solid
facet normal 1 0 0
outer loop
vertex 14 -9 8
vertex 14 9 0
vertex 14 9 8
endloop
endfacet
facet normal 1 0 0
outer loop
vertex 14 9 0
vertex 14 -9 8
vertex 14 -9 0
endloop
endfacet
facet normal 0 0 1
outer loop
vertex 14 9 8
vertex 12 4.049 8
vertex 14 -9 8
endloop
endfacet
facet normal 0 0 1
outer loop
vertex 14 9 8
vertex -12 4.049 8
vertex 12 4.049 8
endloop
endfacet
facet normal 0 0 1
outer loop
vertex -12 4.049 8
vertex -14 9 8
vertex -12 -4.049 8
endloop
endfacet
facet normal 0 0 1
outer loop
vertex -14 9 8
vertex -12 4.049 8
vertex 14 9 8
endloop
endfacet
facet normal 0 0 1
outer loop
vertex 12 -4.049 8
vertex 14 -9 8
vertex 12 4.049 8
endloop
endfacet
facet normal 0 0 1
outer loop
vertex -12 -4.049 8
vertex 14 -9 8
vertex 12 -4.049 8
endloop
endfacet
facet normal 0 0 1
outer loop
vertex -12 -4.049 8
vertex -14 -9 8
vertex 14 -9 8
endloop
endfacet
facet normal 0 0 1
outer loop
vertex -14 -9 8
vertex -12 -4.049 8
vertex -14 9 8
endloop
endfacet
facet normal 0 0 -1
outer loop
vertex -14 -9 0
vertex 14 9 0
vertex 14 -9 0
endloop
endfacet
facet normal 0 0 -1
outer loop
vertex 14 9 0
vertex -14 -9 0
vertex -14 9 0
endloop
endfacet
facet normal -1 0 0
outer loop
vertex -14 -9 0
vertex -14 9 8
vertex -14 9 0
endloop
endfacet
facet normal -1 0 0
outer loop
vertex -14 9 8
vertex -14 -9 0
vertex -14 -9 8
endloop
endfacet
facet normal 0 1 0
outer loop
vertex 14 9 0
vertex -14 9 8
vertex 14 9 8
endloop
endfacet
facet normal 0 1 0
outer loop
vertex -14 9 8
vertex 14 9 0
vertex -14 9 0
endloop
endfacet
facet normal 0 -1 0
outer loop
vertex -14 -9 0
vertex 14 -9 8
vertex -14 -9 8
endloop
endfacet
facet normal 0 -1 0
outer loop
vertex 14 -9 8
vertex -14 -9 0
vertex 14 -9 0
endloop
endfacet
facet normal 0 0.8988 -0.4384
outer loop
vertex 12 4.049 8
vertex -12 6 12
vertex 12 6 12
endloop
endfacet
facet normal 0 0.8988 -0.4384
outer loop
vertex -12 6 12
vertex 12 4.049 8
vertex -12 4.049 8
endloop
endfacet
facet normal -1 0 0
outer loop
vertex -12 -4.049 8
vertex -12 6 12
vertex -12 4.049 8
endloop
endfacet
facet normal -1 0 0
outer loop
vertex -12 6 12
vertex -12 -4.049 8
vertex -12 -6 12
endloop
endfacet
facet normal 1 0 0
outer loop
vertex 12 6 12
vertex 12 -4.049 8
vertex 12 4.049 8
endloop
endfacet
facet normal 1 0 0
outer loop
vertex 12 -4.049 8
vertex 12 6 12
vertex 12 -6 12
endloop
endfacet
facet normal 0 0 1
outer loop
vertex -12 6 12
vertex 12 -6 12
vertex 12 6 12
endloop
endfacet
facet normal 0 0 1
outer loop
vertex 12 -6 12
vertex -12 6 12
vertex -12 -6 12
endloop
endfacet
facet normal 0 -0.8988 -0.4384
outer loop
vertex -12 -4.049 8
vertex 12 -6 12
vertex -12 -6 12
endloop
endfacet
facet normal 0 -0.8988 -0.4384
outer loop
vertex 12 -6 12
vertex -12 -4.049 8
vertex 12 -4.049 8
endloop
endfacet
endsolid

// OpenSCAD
// Small printable lock prototypes for the smart mechanical block concept.
//
// Each scene exports one printable part. The parts are intentionally small
// fit coupons: big enough to test the lock by hand, but cheap to print.

$fn = 48;

prototype = 1;
part = "dovetail_male";

fit = 0.35;
loose_fit = 0.45;
block_l = 28;
block_w = 18;
block_h = 8;

function known_part(prototype_number, part_name) =
    (prototype_number == 1 &&
        (part_name == "dovetail_male" ||
            part_name == "dovetail_socket")) ||
    (prototype_number == 2 &&
        (part_name == "bayonet_plug" ||
            part_name == "bayonet_socket")) ||
    (prototype_number == 3 &&
        (part_name == "snap_hook" ||
            part_name == "snap_socket")) ||
    (prototype_number == 4 &&
        (part_name == "wedge_left" ||
            part_name == "wedge_right" ||
            part_name == "wedge_key")) ||
    (prototype_number == 5 &&
        (part_name == "t_slider" ||
            part_name == "t_track")) ||
    (prototype_number == 6 &&
        (part_name == "split_pin_male" ||
            part_name == "split_pin_socket")) ||
    (prototype_number == 7 &&
        (part_name == "thread_plug" ||
            part_name == "thread_socket")) ||
    (prototype_number == 8 &&
        (part_name == "detent_slider" ||
            part_name == "detent_track")) ||
    (prototype_number == 9 &&
        (part_name == "cam_clamp_body" ||
            part_name == "cam_lever" ||
            part_name == "cam_pin")) ||
    (prototype_number == 10 &&
        (part_name == "rack_bar" ||
            part_name == "rack_pawl"));

module block(l = block_l, w = block_w, h = block_h) {
    translate([-l / 2, -w / 2, 0])
        cube([l, w, h]);
}

module prism_x(length, yz_points) {
    rotate([0, 90, 0])
        linear_extrude(height = length, center = true)
            polygon([for (point = yz_points) [-point[1], point[0]]]);
}

module round_pin_x(length, diameter) {
    rotate([0, 90, 0])
        cylinder(d = diameter, h = length, center = true);
}

module round_pin_y(length, diameter) {
    rotate([90, 0, 0])
        cylinder(d = diameter, h = length, center = true);
}

module teardrop_hole_x(length, diameter) {
    union() {
        round_pin_x(length, diameter);
        translate([0, 0, diameter * 0.22])
            prism_x(
                length,
                [
                    [-diameter / 2, 0],
                    [diameter / 2, 0],
                    [0, diameter * 0.78]
                ]
            );
    }
}

module coarse_two_start_thread(length = 8, outer_d = 10, clearance = 0) {
    pitch = 2.4;
    core_d = outer_d - 1.7 + clearance;
    ridge_depth = 1.05 + clearance / 2;
    ridge_width = 0.88 + clearance / 3;
    slice_count = ceil(length / pitch * 28);

    union() {
        cylinder(d = core_d, h = length);

        for (phase = [0, 180])
            rotate([0, 0, phase])
                linear_extrude(
                    height = length,
                    twist = 360 * length / pitch,
                    slices = slice_count,
                    convexity = 8
                )
                    translate([core_d / 2 - 0.22, -ridge_width / 2])
                        square([ridge_depth + 0.22, ridge_width]);
    }
}

module dovetail_male() {
    union() {
        block();
        prism_x(
            block_l - 4,
            [
                [-4.0, block_h - 0.1],
                [4.0, block_h - 0.1],
                [6.0, block_h + 4.0],
                [-6.0, block_h + 4.0]
            ]
        );
    }
}

module dovetail_socket() {
    difference() {
        block();
        prism_x(
            block_l + 0.4,
            [
                [-(4.0 + fit), -0.1],
                [4.0 + fit, -0.1],
                [6.0 + fit, 4.35],
                [-(6.0 + fit), 4.35]
            ]
        );
    }
}

module bayonet_plug() {
    union() {
        block(24, 24, 5);
        translate([0, 0, 4.9])
            cylinder(d = 7.8, h = 6.2);
        translate([0, 0, 8])
            cube([18, 4.0, 2.4], center = true);
        translate([0, 0, 10.9])
            cylinder(d1 = 7.8, d2 = 6.4, h = 1.5);
    }
}

module bayonet_socket() {
    difference() {
        block(24, 24, 9);

        translate([0, 0, -0.1])
            cylinder(d = 8.5, h = 9.2);

        // Vertical lug entry slots from the top.
        translate([0, 0, 5.1])
            cube([20 + loose_fit, 4.8 + loose_fit, 8.2], center = true);

        // Quarter-turn retention pocket below the top skin.
        translate([0, 0, 3.6])
            cube([4.8 + loose_fit, 20 + loose_fit, 3.0], center = true);

        // Relief at the stop so the lugs seat without grinding.
        for (angle = [90, 270])
            rotate([0, 0, angle])
                translate([0, 8.5, 3.5])
                    cylinder(d = 5.2, h = 3.2, center = true);
    }
}

module snap_hook() {
    union() {
        block(24, 18, 6);

        // Flexible cantilever tongue, printed flat and flexing vertically.
        translate([10.5, -3.2, 5.9])
            cube([12, 6.4, 1.35]);

        translate([21.7, -3.2, 5.9])
            prism_x(
                2.4,
                [
                    [-3.2, 0],
                    [3.2, 0],
                    [3.2, 2.8],
                    [-3.2, 1.15]
                ]
            );
    }
}

module snap_socket() {
    difference() {
        block(24, 18, 8);

        translate([-12.1, -3.8, 5.5])
            cube([13.5, 7.6, 2.2]);

        translate([-2.2, -4.2, 5.6])
            cube([2.4, 8.4, 3.0]);
    }
}

module wedge_receiver(left_side = true) {
    difference() {
        block(24, 18, 8);

        translate([0, 0, 4])
            prism_x(
                25,
                [
                    [-2.7, -2.0],
                    [2.7, -2.0],
                    [4.6, 2.3],
                    [-4.6, 2.3]
                ]
            );

        translate([0, left_side ? 6.5 : -6.5, 3.8])
            cube([25, 3.0, 3.5], center = true);
    }
}

module wedge_key() {
    prism_x(
        30,
        [
            [-2.3, 0],
            [2.3, 0],
            [4.0, 3.8],
            [-4.0, 3.8]
        ]
    );

    translate([-17, -5, 0])
        cube([3, 10, 4.2]);
}

module t_slider() {
    union() {
        block();
        translate([0, 0, block_h])
            cube([block_l - 4, 4.0, 4.2], center = true);
        translate([0, 0, block_h + 3.0])
            cube([block_l - 4, 10.0, 2.4], center = true);
    }
}

module t_track() {
    difference() {
        block();
        translate([0, 0, -0.1])
            cube([block_l + 0.4, 4.0 + fit, 4.9], center = true);
        translate([0, 0, 2.9])
            cube([block_l + 0.4, 10.0 + fit, 3.0], center = true);
    }
}

module split_pin_male() {
    difference() {
        union() {
            block(22, 18, 6);

            for (z_offset = [2.2, 4.8]) {
                translate([10.9, 0, z_offset])
                    cube([9.2, 3.2, 1.4], center = true);

                translate([15.3, 0, z_offset])
                    cube([2.4, 4.8, 1.8], center = true);
            }
        }

        // Split gap lets each printed pin compress while entering the socket.
        translate([12.5, -0.45, 1.2])
            cube([8.2, 0.9, 4.8]);
    }
}

module split_pin_socket() {
    difference() {
        block(22, 18, 8);

        for (z_offset = [2.2, 4.8]) {
            translate([-11.1, 0, z_offset])
                cube([10.2, 3.8 + fit, 1.9 + fit], center = true);

            translate([-5.9, 0, z_offset])
                cube([2.5, 5.4 + fit, 2.2 + fit], center = true);
        }
    }
}

module thread_plug() {
    union() {
        block(22, 22, 5);
        translate([0, 0, 4.9])
            coarse_two_start_thread(length = 8.2, outer_d = 9.8);
    }
}

module thread_socket() {
    difference() {
        block(22, 22, 10);
        translate([0, 0, -0.1])
            coarse_two_start_thread(
                length = 10.2,
                outer_d = 9.8,
                clearance = 0.45
            );
    }
}

module detent_slider() {
    union() {
        block(24, 16, 5);

        translate([0, 0, 5])
            cube([22, 6, 2.0], center = true);

        translate([0, 0, 7.1])
            cube([20, 2.0, 2.8], center = true);

        translate([5, 0, 9.1])
            scale([1.0, 0.75, 0.38])
                sphere(d = 5.0);
    }
}

module detent_track() {
    difference() {
        block(26, 18, 8);

        translate([0, 0, 4.8])
            cube([27, 6.8 + fit, 2.6 + fit], center = true);

        translate([0, 0, 6.8])
            cube([27, 2.8 + fit, 3.1 + fit], center = true);

        for (x_position = [-6, 0, 6])
            translate([x_position, 0, 7.4])
                scale([1.0, 0.8, 0.45])
                    sphere(d = 5.5 + fit);
    }
}

module cam_clamp_body() {
    difference() {
        union() {
            block(28, 24, 16);
            translate([0, 8.5, 8])
                cube([28, 7, 16], center = true);
        }

        translate([0, 0, 8])
            round_pin_x(30, 12.4);

        translate([0, -9, 8])
            cube([30, 8.0, 14.5], center = true);

        translate([0, 11.5, 8])
            round_pin_x(31, 3.4);

        translate([0, 6.4, 8])
            cube([8, 8, 10], center = true);
    }
}

module cam_lever_part() {
    difference() {
        union() {
            translate([-5, 0, 2])
                cube([28, 6, 4], center = true);
            translate([8, 0, 2])
                scale([1.35, 1.0, 1.0])
                    cylinder(d = 12, h = 4, center = true);
            translate([-19, 0, 2])
                cylinder(d = 7, h = 4, center = true);
        }

        translate([0, 0, 2])
            cylinder(d = 3.4, h = 4.4, center = true);
    }
}

module cam_pin() {
    union() {
        cylinder(d = 3.0, h = 27);
        cylinder(d = 5.2, h = 1.2);
        translate([0, 0, 25.8])
            cylinder(d = 5.2, h = 1.2);
    }
}

module rack_teeth(length = 24, tooth_count = 8, base_z = 5) {
    tooth_pitch = length / tooth_count;

    for (index = [0 : tooth_count - 1]) {
        translate([
            -length / 2 + index * tooth_pitch + tooth_pitch / 2,
            0,
            base_z
        ])
            prism_x(
                tooth_pitch * 0.86,
                [
                    [-4.4, 0],
                    [4.4, 0],
                    [0, 3.0]
                ]
            );
    }
}

module rack_bar() {
    union() {
        block(28, 12, 5);
        rack_teeth(24, 8, 4.9);
    }
}

module rack_pawl() {
    union() {
        block(24, 16, 6);

        translate([-8, -2.2, 5.9])
            cube([16, 4.4, 1.25]);

        translate([6.8, 0, 6.9])
            prism_x(
                3.0,
                [
                    [-4.0, 0],
                    [4.0, 0],
                    [0, 3.2]
                ]
            );

        translate([8, 0, 4.6])
            cube([4, 9.5, 2.0], center = true);
    }
}

assert(
    known_part(prototype, part),
    str("Unknown prototype/part combination: prototype=", prototype, " part=", part)
);

if (prototype == 1 && part == "dovetail_male") {
    dovetail_male();
} else if (prototype == 1 && part == "dovetail_socket") {
    dovetail_socket();
} else if (prototype == 2 && part == "bayonet_plug") {
    bayonet_plug();
} else if (prototype == 2 && part == "bayonet_socket") {
    bayonet_socket();
} else if (prototype == 3 && part == "snap_hook") {
    snap_hook();
} else if (prototype == 3 && part == "snap_socket") {
    snap_socket();
} else if (prototype == 4 && part == "wedge_left") {
    wedge_receiver(true);
} else if (prototype == 4 && part == "wedge_right") {
    wedge_receiver(false);
} else if (prototype == 4 && part == "wedge_key") {
    wedge_key();
} else if (prototype == 5 && part == "t_slider") {
    t_slider();
} else if (prototype == 5 && part == "t_track") {
    t_track();
} else if (prototype == 6 && part == "split_pin_male") {
    split_pin_male();
} else if (prototype == 6 && part == "split_pin_socket") {
    split_pin_socket();
} else if (prototype == 7 && part == "thread_plug") {
    thread_plug();
} else if (prototype == 7 && part == "thread_socket") {
    thread_socket();
} else if (prototype == 8 && part == "detent_slider") {
    detent_slider();
} else if (prototype == 8 && part == "detent_track") {
    detent_track();
} else if (prototype == 9 && part == "cam_clamp_body") {
    cam_clamp_body();
} else if (prototype == 9 && part == "cam_lever") {
    cam_lever_part();
} else if (prototype == 9 && part == "cam_pin") {
    cam_pin();
} else if (prototype == 10 && part == "rack_bar") {
    rack_bar();
} else if (prototype == 10 && part == "rack_pawl") {
    rack_pawl();
}
